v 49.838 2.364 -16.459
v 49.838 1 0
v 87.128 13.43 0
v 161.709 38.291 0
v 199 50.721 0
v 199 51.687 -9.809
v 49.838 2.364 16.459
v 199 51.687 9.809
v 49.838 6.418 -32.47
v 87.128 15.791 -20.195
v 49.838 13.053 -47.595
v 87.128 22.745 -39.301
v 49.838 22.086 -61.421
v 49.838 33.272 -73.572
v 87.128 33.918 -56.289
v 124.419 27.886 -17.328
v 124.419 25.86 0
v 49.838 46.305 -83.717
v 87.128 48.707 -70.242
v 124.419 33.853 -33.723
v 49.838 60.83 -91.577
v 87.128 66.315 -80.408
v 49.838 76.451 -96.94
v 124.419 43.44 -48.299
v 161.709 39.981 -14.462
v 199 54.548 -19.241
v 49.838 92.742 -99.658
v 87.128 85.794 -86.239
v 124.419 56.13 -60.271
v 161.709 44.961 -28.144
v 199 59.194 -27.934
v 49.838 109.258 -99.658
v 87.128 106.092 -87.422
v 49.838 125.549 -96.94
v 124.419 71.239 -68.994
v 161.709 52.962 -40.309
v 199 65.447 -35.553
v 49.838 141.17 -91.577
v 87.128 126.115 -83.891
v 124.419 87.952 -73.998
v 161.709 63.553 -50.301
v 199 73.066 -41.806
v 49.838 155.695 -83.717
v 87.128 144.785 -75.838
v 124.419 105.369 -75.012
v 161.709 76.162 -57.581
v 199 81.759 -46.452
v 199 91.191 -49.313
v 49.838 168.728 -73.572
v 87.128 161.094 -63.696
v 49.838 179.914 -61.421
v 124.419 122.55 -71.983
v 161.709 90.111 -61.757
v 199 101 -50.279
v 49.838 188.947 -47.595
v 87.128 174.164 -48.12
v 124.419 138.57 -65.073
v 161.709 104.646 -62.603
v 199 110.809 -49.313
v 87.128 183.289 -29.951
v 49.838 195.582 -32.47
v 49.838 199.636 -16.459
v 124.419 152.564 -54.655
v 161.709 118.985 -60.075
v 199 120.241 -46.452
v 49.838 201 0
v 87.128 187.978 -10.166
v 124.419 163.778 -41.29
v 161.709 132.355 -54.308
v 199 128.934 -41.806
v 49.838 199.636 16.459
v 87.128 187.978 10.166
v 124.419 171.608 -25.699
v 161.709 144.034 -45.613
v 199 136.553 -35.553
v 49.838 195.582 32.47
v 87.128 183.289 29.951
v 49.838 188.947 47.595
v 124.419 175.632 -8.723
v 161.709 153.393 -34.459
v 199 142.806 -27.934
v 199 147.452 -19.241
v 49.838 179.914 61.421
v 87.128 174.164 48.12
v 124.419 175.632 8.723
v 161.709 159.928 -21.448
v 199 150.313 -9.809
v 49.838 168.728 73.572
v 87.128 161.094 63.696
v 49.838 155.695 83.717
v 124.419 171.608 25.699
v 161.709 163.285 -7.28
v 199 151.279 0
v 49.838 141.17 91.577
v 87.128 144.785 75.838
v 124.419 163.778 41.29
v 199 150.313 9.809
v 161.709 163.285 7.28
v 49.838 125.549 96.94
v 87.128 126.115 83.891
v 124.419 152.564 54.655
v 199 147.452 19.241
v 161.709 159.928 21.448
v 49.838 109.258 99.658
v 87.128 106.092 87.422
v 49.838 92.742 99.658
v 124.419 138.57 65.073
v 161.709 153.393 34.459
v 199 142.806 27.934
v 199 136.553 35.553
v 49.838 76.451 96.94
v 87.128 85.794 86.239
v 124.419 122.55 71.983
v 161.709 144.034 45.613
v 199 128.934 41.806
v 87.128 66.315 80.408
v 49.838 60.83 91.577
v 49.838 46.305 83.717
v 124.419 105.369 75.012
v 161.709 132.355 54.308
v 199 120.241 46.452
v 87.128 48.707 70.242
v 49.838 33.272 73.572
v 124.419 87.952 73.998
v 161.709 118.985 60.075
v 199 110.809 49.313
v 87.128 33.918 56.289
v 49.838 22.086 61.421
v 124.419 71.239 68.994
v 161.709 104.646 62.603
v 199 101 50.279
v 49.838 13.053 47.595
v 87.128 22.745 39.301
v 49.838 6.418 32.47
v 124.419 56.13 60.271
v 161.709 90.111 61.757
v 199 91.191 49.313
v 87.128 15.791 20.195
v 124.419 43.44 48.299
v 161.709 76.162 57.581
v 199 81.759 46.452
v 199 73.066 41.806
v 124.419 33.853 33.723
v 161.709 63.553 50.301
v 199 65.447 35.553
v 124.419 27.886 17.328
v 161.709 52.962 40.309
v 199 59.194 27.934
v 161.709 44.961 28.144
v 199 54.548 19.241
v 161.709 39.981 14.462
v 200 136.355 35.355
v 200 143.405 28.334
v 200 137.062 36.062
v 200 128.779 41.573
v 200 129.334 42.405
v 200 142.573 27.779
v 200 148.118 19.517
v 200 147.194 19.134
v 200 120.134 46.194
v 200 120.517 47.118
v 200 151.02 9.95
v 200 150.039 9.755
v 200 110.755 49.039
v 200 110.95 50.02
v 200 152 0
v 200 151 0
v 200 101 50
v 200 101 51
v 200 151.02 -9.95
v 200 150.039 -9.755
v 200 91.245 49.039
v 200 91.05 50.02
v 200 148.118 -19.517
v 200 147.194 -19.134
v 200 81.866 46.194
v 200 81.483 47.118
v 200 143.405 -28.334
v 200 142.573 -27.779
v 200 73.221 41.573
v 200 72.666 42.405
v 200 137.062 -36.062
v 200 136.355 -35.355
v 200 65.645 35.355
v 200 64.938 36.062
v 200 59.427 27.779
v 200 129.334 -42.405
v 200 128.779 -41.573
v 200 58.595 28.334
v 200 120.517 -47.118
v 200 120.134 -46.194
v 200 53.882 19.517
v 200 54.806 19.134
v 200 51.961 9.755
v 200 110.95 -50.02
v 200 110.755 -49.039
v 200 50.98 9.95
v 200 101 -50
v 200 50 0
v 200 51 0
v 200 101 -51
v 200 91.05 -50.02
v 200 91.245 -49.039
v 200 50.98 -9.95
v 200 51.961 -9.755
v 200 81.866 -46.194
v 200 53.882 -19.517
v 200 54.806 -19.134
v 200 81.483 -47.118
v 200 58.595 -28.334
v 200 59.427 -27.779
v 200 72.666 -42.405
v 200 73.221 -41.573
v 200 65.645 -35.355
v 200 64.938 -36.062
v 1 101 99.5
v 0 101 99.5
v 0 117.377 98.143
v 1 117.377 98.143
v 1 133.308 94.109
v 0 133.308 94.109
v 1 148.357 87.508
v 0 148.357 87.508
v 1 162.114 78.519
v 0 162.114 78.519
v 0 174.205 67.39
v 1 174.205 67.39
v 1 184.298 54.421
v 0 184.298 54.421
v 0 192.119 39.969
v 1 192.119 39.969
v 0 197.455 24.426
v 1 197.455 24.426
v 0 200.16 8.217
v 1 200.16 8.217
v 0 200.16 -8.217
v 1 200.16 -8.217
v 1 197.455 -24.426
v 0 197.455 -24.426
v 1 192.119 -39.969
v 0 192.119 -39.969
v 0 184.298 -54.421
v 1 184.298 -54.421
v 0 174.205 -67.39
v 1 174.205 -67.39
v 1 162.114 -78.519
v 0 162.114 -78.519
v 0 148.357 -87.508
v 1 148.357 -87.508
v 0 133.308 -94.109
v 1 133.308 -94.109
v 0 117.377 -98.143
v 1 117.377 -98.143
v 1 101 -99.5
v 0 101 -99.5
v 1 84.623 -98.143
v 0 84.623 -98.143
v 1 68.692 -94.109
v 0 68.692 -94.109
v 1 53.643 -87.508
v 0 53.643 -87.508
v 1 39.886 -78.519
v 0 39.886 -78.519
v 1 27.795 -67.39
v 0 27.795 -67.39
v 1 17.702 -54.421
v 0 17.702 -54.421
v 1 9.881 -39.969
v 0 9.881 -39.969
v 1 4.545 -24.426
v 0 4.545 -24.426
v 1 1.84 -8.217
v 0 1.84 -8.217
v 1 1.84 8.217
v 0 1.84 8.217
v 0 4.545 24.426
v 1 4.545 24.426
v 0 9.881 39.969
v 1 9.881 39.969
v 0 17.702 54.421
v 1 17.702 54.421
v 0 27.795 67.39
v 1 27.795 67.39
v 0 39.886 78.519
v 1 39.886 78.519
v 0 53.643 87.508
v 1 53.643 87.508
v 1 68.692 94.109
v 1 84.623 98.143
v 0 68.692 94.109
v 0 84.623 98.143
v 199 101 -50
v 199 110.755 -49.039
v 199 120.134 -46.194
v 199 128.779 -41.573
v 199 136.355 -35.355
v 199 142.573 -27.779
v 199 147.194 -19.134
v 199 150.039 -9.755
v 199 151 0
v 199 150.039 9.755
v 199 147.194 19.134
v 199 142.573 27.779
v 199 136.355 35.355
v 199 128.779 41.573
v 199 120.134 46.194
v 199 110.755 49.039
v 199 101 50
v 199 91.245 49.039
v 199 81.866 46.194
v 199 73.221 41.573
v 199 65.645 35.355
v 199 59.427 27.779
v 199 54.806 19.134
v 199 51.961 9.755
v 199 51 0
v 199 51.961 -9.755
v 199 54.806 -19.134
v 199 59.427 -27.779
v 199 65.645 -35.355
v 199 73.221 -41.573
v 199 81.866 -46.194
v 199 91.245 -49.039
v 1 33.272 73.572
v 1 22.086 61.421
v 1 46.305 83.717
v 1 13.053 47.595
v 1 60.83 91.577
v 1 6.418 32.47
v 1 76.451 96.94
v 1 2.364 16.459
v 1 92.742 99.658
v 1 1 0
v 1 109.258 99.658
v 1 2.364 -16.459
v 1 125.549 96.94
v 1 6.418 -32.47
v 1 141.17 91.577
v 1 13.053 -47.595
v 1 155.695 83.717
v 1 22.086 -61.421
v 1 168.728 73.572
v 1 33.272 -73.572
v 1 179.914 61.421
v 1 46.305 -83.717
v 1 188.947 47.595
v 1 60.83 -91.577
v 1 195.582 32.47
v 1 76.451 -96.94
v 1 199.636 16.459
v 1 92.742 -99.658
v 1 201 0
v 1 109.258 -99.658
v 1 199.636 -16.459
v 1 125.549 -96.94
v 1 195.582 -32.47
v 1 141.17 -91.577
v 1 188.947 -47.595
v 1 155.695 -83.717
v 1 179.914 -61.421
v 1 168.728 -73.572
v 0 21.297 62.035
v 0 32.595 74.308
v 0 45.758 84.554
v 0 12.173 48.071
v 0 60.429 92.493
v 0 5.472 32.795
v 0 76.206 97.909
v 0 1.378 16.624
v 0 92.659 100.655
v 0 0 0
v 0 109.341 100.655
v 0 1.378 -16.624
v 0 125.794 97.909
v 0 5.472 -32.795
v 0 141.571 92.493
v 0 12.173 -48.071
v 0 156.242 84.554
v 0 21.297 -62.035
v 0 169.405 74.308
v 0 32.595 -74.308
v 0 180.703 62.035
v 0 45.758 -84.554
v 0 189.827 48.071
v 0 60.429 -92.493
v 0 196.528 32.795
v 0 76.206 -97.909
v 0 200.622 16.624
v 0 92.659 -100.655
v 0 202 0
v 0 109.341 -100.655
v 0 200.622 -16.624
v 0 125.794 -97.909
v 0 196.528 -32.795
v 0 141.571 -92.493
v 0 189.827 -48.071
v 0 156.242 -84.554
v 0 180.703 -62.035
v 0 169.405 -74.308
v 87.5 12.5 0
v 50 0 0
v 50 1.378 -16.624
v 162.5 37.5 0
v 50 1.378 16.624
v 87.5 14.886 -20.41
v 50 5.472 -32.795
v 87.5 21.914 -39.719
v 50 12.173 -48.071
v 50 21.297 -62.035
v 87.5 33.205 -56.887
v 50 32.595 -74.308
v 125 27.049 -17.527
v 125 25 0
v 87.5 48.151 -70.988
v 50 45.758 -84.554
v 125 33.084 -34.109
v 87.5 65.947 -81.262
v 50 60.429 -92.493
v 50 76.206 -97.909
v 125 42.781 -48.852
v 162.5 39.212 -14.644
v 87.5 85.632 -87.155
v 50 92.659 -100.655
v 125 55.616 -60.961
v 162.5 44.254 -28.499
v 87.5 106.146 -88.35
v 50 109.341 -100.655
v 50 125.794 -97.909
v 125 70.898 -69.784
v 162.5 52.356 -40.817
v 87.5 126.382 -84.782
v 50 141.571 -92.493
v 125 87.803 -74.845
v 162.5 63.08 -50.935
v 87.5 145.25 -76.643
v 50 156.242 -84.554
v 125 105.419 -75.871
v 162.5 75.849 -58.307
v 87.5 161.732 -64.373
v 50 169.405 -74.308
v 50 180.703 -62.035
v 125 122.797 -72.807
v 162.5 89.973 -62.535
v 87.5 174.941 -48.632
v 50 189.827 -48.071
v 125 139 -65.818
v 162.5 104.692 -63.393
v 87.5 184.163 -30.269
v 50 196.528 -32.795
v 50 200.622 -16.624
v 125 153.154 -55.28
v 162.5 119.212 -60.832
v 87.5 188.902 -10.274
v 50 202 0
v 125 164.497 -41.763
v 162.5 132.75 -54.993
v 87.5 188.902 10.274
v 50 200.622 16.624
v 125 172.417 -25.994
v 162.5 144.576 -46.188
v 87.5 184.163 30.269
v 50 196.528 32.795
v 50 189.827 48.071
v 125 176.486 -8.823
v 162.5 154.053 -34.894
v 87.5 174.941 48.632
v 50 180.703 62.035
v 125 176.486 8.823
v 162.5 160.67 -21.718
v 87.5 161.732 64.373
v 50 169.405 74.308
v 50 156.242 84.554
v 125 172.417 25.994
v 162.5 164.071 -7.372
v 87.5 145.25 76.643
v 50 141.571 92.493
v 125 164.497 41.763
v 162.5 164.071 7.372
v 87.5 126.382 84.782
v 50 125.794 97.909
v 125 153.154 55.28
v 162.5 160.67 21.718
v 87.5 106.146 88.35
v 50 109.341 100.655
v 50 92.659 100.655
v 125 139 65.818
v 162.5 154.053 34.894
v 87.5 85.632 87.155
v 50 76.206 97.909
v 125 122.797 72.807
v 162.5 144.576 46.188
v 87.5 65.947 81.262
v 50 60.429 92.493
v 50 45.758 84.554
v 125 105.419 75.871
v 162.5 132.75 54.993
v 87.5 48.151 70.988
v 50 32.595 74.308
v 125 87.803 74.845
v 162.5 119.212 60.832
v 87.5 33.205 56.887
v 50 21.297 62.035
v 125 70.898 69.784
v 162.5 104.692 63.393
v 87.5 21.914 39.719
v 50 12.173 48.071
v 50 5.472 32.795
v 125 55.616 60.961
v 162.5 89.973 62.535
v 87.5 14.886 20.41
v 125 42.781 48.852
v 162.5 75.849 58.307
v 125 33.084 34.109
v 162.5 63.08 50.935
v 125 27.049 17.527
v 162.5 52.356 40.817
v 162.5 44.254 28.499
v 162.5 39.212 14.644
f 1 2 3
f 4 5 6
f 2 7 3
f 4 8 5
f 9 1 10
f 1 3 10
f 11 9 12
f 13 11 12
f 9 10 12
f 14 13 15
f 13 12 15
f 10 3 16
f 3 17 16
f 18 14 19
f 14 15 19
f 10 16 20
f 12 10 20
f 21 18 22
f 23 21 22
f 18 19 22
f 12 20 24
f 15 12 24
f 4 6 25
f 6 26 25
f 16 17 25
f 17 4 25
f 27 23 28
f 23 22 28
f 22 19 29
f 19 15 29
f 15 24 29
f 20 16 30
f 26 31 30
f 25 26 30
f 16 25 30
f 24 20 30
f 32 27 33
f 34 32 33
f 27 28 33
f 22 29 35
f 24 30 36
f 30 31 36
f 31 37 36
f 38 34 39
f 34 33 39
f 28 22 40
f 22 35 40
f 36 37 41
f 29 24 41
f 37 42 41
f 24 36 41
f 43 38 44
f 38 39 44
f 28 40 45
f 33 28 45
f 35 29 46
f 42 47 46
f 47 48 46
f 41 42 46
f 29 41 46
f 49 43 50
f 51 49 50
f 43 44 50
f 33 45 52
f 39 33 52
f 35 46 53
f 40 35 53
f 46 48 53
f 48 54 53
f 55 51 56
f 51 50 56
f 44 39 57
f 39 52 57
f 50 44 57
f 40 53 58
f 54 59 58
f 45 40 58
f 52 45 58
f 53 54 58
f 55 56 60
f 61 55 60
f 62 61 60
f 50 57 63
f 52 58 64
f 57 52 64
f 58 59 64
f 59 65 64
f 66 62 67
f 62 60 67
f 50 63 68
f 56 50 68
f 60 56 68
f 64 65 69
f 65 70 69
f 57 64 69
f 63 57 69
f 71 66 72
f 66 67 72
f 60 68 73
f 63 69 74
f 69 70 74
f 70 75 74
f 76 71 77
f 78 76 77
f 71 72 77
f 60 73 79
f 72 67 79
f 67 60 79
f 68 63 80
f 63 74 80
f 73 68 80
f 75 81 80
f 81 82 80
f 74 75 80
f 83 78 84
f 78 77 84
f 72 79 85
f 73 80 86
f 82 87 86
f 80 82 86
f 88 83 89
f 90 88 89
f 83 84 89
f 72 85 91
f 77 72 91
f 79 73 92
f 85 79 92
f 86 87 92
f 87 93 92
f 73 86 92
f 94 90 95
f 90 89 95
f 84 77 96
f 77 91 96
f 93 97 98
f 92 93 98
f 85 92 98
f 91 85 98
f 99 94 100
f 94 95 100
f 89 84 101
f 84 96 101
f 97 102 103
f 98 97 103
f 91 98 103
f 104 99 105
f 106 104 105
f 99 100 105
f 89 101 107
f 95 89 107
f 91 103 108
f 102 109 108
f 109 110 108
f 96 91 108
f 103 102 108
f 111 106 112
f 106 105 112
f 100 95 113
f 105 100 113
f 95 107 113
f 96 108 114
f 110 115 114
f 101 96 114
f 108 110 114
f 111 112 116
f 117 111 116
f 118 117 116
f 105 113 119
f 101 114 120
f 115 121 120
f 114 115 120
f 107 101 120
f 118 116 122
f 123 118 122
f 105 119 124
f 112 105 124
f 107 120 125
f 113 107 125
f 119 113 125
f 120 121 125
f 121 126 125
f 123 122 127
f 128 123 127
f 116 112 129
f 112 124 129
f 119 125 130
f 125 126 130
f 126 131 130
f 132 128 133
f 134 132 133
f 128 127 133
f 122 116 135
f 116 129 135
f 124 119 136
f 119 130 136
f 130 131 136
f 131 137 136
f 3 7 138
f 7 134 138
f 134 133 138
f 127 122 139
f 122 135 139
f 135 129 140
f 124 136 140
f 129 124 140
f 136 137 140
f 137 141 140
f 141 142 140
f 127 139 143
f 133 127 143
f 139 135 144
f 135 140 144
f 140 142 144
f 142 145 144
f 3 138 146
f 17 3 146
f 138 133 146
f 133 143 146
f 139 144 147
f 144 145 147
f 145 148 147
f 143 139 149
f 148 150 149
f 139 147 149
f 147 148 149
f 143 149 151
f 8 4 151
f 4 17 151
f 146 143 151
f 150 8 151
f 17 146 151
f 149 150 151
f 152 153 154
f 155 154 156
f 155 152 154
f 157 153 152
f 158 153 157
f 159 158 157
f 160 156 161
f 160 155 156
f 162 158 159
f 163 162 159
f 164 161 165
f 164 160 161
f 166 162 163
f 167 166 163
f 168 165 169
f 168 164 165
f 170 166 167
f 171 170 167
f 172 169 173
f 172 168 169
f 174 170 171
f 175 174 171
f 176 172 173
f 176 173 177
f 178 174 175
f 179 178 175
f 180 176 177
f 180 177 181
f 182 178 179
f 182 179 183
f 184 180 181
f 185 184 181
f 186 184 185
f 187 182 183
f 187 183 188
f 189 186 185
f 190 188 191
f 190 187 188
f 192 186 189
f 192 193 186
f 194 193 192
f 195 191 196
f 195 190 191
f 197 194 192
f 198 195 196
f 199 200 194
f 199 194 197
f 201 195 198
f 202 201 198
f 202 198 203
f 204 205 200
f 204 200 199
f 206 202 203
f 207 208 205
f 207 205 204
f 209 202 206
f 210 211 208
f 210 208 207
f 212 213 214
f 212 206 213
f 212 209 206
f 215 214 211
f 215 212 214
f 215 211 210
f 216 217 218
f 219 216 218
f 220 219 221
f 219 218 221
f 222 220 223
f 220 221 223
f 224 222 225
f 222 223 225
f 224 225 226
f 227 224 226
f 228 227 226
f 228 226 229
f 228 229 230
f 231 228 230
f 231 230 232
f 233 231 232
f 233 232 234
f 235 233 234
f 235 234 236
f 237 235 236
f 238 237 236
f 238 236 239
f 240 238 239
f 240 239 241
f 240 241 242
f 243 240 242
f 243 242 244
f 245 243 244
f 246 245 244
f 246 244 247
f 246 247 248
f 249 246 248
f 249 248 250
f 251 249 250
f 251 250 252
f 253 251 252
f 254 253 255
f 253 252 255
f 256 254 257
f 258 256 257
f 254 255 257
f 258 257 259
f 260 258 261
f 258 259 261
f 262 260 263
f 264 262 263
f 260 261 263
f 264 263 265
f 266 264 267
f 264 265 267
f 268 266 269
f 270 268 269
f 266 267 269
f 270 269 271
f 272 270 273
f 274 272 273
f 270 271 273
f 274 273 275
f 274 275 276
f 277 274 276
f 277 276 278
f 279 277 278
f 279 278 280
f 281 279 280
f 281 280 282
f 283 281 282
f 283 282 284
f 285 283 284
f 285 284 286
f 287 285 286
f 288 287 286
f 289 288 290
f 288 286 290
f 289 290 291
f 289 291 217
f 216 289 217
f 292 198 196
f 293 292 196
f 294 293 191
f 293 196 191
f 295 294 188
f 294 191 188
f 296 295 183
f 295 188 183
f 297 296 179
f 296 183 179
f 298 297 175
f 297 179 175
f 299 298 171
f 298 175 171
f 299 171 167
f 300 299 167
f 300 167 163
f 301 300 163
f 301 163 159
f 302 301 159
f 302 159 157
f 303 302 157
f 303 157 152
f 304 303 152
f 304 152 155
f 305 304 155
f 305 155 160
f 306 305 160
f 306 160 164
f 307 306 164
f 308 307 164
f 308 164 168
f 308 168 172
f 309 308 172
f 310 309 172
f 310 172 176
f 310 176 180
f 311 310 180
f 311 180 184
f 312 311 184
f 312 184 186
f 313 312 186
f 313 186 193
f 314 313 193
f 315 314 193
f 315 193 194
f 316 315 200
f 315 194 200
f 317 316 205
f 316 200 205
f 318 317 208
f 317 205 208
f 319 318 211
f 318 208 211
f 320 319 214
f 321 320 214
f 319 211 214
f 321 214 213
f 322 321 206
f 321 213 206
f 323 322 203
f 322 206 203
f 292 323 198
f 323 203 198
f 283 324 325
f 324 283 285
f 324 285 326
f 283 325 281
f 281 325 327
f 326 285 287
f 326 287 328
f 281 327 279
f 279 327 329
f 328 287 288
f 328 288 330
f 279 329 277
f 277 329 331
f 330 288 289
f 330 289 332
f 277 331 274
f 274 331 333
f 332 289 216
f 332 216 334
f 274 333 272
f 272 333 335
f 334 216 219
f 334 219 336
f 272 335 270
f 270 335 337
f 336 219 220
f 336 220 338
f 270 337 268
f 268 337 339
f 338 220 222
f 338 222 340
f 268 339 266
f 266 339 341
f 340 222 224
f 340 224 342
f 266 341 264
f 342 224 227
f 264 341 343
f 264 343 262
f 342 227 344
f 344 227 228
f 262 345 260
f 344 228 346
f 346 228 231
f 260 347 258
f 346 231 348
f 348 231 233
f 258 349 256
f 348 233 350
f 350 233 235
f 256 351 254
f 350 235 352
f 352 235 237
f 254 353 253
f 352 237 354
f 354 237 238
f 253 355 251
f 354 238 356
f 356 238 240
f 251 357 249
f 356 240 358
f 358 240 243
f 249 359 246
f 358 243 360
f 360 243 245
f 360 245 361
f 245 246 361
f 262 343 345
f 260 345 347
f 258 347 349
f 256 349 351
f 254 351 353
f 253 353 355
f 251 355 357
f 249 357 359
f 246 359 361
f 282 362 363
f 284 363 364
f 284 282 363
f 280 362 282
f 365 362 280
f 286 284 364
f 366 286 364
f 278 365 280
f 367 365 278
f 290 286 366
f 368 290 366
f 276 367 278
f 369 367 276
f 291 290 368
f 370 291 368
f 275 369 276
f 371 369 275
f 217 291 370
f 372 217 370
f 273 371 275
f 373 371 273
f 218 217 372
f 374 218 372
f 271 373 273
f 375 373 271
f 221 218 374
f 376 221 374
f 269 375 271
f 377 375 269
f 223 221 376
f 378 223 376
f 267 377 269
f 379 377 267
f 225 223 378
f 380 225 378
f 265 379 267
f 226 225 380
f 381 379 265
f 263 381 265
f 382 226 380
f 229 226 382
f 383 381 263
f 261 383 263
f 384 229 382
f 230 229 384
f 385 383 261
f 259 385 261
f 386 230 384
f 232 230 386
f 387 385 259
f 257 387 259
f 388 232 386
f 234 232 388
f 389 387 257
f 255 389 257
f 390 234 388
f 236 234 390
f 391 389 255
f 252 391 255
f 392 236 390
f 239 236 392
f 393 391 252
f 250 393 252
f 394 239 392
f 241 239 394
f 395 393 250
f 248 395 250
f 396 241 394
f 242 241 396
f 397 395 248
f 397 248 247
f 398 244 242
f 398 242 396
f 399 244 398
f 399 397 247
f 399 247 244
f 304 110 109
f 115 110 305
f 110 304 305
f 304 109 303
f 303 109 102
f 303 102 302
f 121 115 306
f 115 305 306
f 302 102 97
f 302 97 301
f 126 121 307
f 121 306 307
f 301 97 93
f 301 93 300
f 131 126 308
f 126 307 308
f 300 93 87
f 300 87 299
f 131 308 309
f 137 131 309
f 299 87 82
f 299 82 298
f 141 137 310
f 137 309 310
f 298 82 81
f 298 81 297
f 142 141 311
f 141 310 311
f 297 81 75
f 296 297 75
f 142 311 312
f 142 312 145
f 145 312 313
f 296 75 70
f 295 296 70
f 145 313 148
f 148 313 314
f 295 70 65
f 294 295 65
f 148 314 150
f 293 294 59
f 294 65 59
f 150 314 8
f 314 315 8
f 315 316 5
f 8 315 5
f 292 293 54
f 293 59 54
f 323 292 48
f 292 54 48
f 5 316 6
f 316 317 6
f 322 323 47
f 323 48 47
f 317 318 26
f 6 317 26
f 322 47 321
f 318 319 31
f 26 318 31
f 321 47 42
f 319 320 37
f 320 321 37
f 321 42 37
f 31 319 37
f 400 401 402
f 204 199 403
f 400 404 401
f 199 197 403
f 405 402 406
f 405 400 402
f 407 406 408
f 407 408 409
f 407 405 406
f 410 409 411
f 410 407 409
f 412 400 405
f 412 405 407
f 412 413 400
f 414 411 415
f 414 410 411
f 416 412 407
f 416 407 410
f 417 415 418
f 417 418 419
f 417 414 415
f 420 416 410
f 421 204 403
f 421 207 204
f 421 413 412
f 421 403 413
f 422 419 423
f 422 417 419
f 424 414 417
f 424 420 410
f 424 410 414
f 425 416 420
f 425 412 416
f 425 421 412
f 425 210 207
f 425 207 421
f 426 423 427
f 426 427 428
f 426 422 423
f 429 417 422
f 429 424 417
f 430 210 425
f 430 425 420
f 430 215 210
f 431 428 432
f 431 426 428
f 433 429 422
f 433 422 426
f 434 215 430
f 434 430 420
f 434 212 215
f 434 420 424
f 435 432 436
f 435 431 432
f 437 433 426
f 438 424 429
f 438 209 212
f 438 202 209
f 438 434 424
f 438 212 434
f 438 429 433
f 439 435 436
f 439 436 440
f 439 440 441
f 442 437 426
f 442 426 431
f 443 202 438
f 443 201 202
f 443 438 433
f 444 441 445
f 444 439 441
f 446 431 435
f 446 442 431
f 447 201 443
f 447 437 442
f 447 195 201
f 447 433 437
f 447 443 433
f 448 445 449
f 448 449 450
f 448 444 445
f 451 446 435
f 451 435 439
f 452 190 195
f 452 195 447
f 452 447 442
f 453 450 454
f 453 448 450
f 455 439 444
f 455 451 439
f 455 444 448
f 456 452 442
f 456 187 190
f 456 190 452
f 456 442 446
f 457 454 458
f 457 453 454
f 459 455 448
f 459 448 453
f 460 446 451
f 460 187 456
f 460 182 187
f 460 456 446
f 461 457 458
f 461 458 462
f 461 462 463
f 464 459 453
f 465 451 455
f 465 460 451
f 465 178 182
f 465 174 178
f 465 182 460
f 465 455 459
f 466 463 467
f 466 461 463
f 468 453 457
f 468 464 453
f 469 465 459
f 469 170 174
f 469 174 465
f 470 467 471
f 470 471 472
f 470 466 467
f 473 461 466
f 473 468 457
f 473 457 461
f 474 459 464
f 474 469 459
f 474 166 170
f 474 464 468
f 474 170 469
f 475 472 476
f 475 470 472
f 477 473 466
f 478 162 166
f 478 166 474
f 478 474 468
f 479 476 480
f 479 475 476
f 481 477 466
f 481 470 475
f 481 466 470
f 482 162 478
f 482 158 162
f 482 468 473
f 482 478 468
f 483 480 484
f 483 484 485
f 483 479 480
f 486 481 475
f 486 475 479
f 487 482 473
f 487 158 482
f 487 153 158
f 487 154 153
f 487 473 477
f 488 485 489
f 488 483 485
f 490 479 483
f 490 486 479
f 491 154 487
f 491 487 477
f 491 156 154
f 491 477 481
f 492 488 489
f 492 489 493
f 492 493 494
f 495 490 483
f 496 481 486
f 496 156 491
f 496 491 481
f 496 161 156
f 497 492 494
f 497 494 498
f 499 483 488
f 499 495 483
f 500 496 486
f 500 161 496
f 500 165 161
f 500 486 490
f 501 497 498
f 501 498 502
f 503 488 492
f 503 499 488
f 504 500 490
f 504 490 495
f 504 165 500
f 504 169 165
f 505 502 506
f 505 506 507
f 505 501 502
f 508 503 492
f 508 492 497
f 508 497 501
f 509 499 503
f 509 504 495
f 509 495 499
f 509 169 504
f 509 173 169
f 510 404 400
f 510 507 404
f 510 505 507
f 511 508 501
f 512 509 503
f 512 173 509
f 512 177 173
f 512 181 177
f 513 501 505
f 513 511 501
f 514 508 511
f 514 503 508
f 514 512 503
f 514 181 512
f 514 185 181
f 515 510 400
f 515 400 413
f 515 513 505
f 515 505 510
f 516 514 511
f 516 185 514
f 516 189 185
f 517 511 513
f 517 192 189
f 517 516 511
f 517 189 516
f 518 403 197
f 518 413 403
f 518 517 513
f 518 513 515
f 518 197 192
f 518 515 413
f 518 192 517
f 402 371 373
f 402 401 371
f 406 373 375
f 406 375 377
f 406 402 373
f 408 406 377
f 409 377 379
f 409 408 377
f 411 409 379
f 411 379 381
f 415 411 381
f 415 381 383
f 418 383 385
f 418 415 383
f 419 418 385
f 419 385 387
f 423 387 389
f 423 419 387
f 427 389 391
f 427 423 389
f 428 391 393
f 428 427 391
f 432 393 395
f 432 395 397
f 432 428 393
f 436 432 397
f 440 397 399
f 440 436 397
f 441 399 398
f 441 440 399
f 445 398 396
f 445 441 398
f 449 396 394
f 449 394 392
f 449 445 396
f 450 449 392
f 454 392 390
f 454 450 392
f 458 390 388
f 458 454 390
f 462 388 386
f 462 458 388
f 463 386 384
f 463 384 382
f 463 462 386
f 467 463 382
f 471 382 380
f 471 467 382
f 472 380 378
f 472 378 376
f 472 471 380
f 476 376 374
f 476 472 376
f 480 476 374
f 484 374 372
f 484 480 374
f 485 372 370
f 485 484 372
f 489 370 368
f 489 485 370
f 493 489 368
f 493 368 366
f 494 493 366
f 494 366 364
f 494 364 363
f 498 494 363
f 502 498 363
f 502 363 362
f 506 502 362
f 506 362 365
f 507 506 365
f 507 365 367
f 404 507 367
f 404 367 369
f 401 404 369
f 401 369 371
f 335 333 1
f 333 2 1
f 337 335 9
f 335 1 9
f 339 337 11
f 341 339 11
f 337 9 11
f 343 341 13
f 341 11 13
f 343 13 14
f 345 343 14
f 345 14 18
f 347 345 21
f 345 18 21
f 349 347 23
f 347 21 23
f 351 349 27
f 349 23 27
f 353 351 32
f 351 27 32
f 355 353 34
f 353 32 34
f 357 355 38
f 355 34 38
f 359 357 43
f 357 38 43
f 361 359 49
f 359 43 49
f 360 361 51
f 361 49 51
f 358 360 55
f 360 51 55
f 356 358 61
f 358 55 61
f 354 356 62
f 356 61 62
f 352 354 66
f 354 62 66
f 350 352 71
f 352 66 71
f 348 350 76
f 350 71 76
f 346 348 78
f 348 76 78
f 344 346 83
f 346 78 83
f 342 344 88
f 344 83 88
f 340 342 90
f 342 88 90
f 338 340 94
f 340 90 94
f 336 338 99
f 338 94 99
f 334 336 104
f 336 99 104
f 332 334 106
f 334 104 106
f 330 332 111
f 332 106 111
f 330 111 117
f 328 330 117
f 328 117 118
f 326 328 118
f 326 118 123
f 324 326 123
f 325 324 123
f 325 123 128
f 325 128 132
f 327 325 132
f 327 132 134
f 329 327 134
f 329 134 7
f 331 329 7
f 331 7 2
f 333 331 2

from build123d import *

# Parameters (mm, degrees)
SKETCH2_R          = 50
CUT_EXTRUDE1_DEPTH = 10
SKETCH3_R          = 1
CUT_EXTRUDE2_DEPTH = 180
SKETCH4_R          = 1
CUT_EXTRUDE3_DEPTH = 1
SKETCH5_R          = 99.5
CUT_EXTRUDE7_DEPTH = 26


with BuildPart() as part:
    # Sketch1 → Revolve1 (revolve)
    with BuildSketch(Plane.XY):
        Polygon((0, 0), (50, 0), (200, 50), (200, 101), (0, 101), align=None)
        Polygon((49.83772234, 1), (199, 50.72075922), (199, 100), (1, 100), (1, 1), align=None, mode=Mode.SUBTRACT)
    revolve(axis=Axis((0, 101, 0), (1, 0, 0)))

    # Sketch2 → Cut-Extrude1 (cut)
    with BuildSketch(Plane(origin=(200, 0, 0), x_dir=(0, 0, -1), z_dir=(1, 0, 0))):
        with Locations((0, 101)):
            Circle(SKETCH2_R)
    extrude(amount=-CUT_EXTRUDE1_DEPTH, mode=Mode.SUBTRACT)

    # Sketch3 → Cut-Extrude2 (cut)
    with BuildSketch(Plane(origin=(190, 0, 0), x_dir=(0, 0, -1), z_dir=(1, 0, 0))):
        with Locations((0, 101)):
            Circle(SKETCH3_R)
    extrude(amount=-CUT_EXTRUDE2_DEPTH, mode=Mode.SUBTRACT)

    # Sketch4 → Cut-Extrude3 (cut)
    with BuildSketch(Plane(origin=(10, 0, 0), x_dir=(0, 0, -1), z_dir=(1, 0, 0))):
        with Locations((0, 101)):
            Circle(SKETCH4_R)
    extrude(amount=-CUT_EXTRUDE3_DEPTH, mode=Mode.SUBTRACT)

    # Sketch5 → Cut-Extrude7 (cut)
    with BuildSketch(Plane.ZY):
        with Locations((0, 101)):
            Circle(SKETCH5_R)
    extrude(amount=-CUT_EXTRUDE7_DEPTH, mode=Mode.SUBTRACT)


solid = part.part
